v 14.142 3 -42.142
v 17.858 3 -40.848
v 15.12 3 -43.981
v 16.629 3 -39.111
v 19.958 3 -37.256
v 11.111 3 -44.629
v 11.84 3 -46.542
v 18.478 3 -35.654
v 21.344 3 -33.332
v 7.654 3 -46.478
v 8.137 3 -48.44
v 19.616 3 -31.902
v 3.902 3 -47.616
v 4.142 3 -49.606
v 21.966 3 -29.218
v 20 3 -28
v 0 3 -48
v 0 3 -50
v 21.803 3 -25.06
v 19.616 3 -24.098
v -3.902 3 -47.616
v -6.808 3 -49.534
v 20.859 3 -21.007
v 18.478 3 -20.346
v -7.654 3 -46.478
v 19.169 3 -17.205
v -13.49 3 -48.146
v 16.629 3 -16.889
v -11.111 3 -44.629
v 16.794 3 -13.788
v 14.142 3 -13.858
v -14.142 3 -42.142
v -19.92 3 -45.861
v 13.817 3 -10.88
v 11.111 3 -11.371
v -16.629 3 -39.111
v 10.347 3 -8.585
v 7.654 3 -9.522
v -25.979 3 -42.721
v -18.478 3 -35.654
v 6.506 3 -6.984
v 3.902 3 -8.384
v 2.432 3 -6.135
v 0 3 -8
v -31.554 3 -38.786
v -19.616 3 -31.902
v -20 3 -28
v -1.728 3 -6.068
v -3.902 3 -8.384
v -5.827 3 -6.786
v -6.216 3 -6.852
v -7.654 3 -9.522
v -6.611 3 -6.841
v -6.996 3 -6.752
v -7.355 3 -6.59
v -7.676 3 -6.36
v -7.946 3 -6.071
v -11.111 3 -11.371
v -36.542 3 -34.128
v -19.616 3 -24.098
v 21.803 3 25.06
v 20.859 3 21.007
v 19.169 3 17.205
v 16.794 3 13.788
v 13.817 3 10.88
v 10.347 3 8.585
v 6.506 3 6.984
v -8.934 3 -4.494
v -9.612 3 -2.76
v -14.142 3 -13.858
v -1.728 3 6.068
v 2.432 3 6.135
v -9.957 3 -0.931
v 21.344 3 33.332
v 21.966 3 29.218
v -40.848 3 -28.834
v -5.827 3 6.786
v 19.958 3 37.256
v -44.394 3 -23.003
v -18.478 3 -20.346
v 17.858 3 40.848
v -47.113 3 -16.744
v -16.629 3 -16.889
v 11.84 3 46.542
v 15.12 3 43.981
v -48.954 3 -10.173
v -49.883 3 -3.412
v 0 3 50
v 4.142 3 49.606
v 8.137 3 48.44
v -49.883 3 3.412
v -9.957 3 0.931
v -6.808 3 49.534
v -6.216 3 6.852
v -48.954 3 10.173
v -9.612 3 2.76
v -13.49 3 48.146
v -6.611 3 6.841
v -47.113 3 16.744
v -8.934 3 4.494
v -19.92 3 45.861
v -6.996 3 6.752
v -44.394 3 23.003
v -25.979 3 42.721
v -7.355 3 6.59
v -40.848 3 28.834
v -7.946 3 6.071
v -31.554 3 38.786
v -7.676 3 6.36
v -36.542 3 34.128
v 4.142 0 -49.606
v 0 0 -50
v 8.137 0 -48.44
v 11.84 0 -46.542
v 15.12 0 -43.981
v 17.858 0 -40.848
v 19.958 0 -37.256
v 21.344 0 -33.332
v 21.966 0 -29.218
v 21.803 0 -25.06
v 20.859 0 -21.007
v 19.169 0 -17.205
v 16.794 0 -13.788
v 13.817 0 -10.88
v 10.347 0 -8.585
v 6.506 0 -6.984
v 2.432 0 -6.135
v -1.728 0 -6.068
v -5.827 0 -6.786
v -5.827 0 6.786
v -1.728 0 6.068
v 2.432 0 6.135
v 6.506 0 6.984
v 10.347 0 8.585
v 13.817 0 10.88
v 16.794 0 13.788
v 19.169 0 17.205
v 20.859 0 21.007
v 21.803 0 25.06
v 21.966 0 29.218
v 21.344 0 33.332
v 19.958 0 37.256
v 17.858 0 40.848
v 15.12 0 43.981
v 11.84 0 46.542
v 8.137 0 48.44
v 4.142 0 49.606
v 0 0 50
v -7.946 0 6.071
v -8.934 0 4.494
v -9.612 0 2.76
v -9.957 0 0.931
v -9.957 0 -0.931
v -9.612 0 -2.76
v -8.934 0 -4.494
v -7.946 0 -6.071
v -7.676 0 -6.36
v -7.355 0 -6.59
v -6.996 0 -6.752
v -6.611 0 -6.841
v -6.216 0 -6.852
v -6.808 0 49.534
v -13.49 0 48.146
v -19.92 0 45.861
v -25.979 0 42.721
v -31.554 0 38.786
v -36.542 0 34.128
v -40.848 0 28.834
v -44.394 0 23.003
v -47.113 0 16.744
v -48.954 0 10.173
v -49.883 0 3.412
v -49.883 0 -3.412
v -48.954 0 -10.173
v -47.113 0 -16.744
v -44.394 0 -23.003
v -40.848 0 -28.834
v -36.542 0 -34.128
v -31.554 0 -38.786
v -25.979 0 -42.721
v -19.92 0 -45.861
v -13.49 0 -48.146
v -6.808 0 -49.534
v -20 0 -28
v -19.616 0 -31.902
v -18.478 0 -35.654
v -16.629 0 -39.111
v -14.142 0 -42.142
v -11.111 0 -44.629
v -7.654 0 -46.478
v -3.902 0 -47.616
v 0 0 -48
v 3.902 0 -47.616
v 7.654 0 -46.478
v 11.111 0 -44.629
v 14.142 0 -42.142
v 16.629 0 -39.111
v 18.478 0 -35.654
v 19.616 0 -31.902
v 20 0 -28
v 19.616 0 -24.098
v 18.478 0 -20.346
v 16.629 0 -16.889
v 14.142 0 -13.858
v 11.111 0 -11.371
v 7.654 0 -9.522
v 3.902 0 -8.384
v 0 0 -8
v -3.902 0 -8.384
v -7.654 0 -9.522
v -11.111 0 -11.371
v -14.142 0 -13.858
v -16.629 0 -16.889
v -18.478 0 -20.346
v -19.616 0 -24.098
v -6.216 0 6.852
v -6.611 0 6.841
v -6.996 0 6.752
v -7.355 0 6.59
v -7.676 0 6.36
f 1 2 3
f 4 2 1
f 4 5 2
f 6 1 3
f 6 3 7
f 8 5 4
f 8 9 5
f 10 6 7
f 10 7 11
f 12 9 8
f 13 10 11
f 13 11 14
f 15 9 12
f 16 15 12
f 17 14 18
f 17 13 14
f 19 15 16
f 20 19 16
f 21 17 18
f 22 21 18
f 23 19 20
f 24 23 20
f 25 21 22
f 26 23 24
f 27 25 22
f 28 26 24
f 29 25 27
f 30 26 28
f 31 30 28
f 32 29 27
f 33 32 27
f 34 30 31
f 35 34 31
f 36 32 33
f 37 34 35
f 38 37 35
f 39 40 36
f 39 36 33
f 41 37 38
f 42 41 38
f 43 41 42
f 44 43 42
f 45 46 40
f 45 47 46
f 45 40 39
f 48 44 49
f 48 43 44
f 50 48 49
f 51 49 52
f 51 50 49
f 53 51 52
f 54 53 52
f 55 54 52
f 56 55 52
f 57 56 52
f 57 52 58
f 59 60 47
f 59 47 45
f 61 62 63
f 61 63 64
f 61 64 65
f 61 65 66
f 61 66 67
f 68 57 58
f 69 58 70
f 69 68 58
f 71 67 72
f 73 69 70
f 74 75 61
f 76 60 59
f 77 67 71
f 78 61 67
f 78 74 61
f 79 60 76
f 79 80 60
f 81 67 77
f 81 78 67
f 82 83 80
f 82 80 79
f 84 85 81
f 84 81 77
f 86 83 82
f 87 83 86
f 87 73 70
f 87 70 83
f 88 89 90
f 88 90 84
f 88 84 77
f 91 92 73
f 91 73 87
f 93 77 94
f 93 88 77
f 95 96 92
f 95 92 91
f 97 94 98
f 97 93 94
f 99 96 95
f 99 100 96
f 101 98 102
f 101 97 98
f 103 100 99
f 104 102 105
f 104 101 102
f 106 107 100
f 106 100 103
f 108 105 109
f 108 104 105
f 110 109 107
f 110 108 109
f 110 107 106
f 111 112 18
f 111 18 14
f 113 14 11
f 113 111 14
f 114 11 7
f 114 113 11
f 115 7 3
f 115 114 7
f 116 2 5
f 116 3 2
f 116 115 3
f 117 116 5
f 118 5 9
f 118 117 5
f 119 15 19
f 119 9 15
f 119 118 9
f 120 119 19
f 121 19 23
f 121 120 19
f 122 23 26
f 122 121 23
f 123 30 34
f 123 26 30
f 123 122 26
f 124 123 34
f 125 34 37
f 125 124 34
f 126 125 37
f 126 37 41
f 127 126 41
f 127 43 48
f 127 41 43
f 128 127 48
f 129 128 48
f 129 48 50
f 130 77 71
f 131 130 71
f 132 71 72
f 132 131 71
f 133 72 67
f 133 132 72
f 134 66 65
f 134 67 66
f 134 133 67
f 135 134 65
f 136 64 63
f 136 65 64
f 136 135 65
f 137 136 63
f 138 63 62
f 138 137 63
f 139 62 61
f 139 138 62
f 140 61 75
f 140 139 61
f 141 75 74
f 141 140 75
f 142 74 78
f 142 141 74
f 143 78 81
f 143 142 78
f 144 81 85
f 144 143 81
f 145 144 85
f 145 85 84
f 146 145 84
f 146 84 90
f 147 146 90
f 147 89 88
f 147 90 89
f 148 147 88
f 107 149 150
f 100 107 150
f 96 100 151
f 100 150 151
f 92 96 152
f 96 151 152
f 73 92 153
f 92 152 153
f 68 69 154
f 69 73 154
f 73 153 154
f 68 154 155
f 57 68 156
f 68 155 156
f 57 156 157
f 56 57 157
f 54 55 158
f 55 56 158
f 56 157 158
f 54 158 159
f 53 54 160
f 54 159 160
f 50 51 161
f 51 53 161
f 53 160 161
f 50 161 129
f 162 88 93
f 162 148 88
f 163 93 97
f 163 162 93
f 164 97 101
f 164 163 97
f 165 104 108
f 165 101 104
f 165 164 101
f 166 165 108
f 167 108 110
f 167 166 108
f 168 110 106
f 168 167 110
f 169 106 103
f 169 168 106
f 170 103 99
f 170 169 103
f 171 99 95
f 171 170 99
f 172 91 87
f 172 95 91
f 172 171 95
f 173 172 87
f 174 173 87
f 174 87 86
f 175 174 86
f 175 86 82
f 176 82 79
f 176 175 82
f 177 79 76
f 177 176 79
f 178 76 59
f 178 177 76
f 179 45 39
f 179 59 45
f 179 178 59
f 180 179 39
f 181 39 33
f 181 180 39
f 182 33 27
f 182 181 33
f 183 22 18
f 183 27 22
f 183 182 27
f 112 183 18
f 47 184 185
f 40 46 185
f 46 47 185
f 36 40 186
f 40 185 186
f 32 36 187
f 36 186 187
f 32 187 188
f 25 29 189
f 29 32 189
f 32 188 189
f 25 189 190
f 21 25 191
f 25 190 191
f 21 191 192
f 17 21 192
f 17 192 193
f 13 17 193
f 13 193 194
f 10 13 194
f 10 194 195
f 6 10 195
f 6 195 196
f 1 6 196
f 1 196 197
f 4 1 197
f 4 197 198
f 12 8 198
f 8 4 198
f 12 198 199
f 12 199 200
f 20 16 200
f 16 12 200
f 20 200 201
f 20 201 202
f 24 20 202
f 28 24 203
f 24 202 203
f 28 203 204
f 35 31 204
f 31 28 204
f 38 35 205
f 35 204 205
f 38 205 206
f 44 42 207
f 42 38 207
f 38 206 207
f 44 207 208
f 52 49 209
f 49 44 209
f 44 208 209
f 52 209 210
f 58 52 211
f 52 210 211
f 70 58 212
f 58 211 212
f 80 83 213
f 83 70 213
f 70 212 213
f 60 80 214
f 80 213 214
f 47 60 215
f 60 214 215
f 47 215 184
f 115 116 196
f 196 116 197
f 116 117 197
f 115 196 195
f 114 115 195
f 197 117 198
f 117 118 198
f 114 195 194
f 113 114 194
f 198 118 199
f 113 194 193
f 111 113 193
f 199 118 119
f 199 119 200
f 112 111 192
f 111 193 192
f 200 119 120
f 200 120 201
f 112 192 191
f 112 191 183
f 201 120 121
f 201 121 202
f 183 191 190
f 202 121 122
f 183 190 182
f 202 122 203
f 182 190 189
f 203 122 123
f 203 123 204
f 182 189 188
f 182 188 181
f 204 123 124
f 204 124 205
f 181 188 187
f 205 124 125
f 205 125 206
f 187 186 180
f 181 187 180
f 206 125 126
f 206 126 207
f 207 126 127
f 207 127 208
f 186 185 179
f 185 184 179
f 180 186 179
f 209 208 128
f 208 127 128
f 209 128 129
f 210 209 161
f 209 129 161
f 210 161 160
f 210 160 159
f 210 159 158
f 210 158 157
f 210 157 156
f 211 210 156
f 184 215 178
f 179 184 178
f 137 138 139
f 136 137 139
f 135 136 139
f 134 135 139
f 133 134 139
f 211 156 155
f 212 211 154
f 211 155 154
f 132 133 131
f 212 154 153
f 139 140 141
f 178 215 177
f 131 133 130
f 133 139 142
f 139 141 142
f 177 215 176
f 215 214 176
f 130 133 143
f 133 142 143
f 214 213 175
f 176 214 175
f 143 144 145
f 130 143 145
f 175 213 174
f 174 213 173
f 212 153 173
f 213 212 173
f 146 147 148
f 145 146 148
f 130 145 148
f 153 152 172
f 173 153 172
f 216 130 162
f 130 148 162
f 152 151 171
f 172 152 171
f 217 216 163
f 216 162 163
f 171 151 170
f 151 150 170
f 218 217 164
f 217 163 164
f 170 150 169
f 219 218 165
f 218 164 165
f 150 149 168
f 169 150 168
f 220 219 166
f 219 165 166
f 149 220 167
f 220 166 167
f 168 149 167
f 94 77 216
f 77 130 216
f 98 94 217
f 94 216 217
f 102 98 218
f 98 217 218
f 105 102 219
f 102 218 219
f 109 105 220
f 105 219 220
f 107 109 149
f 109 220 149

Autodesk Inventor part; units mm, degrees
ref_plane "YZ Plane" through (0, 0, 0) normal (1, 0, 0) x (0, 1, 0)
ref_plane "XZ Plane" through (0, 0, 0) normal (0, 1, 0) x (-1, 0, 0)
ref_plane "XY Plane" through (0, 0, 0) normal (0, 0, 1) x (1, 0, 0)
sketch "Sketch1" plane through (0, 0, 0) normal (0, 1, 0) x (-1, 0, 0)
  arc A0 (0, -50) -> (0, 50) centre (0, 0) ccw
  circle A1 centre (0, -28) radius 20
  arc A2 (5.827, -6.7857) -> (0, -50) centre (0, -28) ccw
  arc A3 (0, 50) -> (5.827, 6.7857) centre (0, 28) ccw
  arc A4 (7.9459, -6.0714) -> (7.9459, 6.0714) centre (0, 0) ccw
  arc A5 (7.9459, 6.0714) -> (5.827, 6.7857) centre (6.3567, 4.8571) ccw
  arc A6 (5.827, -6.7857) -> (7.9459, -6.0714) centre (6.3567, -4.8571) ccw
  dimension "d3" = 40
extrude "Extrusion1" add sketch "Sketch1" along normal blind 3
properties part number "Holder"
